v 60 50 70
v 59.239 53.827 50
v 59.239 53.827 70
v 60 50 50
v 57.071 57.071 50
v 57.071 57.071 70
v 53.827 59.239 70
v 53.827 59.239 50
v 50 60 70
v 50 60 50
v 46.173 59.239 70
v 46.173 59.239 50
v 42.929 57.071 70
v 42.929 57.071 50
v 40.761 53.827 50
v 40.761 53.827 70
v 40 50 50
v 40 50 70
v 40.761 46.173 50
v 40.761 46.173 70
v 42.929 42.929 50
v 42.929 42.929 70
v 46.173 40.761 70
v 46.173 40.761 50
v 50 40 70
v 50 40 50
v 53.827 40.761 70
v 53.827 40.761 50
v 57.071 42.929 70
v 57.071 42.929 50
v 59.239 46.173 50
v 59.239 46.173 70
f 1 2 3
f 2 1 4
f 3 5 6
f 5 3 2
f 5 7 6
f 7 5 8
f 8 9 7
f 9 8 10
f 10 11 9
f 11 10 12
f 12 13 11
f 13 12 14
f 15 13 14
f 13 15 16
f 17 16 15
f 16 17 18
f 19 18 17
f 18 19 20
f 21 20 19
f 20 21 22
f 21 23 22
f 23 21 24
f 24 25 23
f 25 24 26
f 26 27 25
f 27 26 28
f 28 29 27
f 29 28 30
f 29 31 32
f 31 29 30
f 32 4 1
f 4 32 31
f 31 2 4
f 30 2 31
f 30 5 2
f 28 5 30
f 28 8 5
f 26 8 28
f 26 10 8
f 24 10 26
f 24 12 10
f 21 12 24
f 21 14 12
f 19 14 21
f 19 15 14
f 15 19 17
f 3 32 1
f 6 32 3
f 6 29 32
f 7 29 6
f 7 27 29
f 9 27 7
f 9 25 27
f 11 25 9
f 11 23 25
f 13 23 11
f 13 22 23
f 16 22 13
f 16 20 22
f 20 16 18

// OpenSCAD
use <../_openscad_libs/threads.scad>


/*[ Slider ]*/
$fn=16; // [16:64]
// Width    Height     Depth
BASE_SIZE = [100, 100, 50];
/*[ Slider ]*/
BASE_FILLET = 5; // [0:50]
BASE_WALL_THICKNESS = 5; // [0:50]
/*[ Slider ]*/
// The height of the cylinder connecting the base and the leds.
SPAR_HEIGHT = 20; // [20:100]
/*[ Slider ]*/
// The height of the cylinder connecting the base and the leds.
LED_SLOT_WIDTH = 20; // [20:100]
/*[ Slider ]*/
// The height of the cylinder connecting the base and the leds.
LED_SLOT_RADIUS = 20; // [20:100]
/*[ Slider ]*/
lamp_straight_height_l=200;// [20:400]
/*[ Slider ]*/
lamp_straight_height_r=100; // [20:400]
/*[ Slider ]*/
led_slot_thickness = 5;// [5:20]
/*[ Slider ]*/
led_slot_depth = 10; // [10:40]

module fillet(r) {
   offset(r = -r) {
     offset(delta = r) {
       children();
     }
   }
}

module base_cover_screws() {
    // Screw holders
    x = BASE_SIZE[0]-BASE_WALL_THICKNESS*2;
    y = BASE_SIZE[1]-BASE_WALL_THICKNESS*2;
    z = 0;
    w = BASE_WALL_THICKNESS*1.33;
    holders = [
        [w,w,z],
        [x+w/2,w,z],
        [x+w/2,y+w/2,z],
        [w,y+w/2,z]
    ];

    for(a=[0:3]) {
        translate(holders[a]) 
        cylinder(h=20, r=2);
        translate(holders[a]-[0,0,2.5]) 
        cylinder(h = 2.5, r = 3.5);
    }
}

module base_cover() {
    difference() {
        translate([0,0,-BASE_WALL_THICKNESS/2])
        linear_extrude(height = BASE_WALL_THICKNESS)
        fillet(r = -BASE_FILLET)
        square([BASE_SIZE[0], BASE_SIZE[1]]);

        base();
    }
}

module base(size=BASE_SIZE) {
    // Screw holders
    x = BASE_SIZE[0]-BASE_WALL_THICKNESS*2;
    y = BASE_SIZE[1]-BASE_WALL_THICKNESS*2;
    z = 3;
    holders = [
        [1,1,z],
        [x-1,1,z],
        [x-1,y-1,z],
        [1,y-1,z]
    ];

    for(a=[0:3]) {
        translate(holders[a]) 
        linear_extrude(height = BASE_SIZE[2]-z)
        fillet(r = -3.5)
        square([10,10]);
    }

    difference() {
        linear_extrude(height = BASE_SIZE[2])
        fillet(r = -BASE_FILLET)
        square([BASE_SIZE[0], BASE_SIZE[1]]);

        translate([BASE_WALL_THICKNESS/2,BASE_WALL_THICKNESS/2,-BASE_WALL_THICKNESS]) 
        linear_extrude(height = BASE_SIZE[2])
        fillet(r = -BASE_FILLET)
        square([BASE_SIZE[0], BASE_SIZE[1]] - [BASE_WALL_THICKNESS, BASE_WALL_THICKNESS]);

        translate([BASE_SIZE[0]/2,BASE_WALL_THICKNESS,20]) 
        rotate([90,00,0]) 
        #cylinder(h = 5, r = 4);
    }
}

module spar_sub() {
    translate([BASE_SIZE[0]/2, BASE_SIZE[1]/2, BASE_SIZE[2] - SPAR_HEIGHT/2]) 
    cylinder(h = SPAR_HEIGHT*2, r = LED_SLOT_WIDTH/2-BASE_WALL_THICKNESS/2);
}

module spar(radius=LED_SLOT_WIDTH, height=SPAR_HEIGHT) {
    difference() {
        translate([BASE_SIZE[0]/2, BASE_SIZE[1]/2, BASE_SIZE[2]]) 
        cylinder(h=SPAR_HEIGHT, r=LED_SLOT_WIDTH/2);
    }
}

module led_slot_circle_sub() {
    center = [BASE_SIZE[0]/2, BASE_SIZE[1]/2, BASE_SIZE[2]];

    // cut out radius
    translate(center + [0,0,SPAR_HEIGHT/2 + LED_SLOT_RADIUS])
    rotate([90,0,0]) 
    cylinder(h = LED_SLOT_WIDTH-led_slot_thickness, r = LED_SLOT_RADIUS-led_slot_thickness, center=true);
}

module led_slot(){
    center = [BASE_SIZE[0]/2, BASE_SIZE[1]/2, BASE_SIZE[2]];
    
    difference() {
        union() {
            translate(center + [0,0,SPAR_HEIGHT/2 + LED_SLOT_RADIUS]) 
            rotate([90,0,0]) 
            cylinder(h = LED_SLOT_WIDTH, r = LED_SLOT_RADIUS, center=true);
        }

        //cut out "slot"
        translate(center + [0,0, SPAR_HEIGHT/2 + LED_SLOT_RADIUS])
        rotate([90,0,0]) 
        cylinder(h = LED_SLOT_WIDTH+5, r = LED_SLOT_RADIUS-led_slot_depth, center=true);

        // cut cylinder in half, to form bottom half circle of lamp
        translate(center + [0,0, SPAR_HEIGHT/2 + LED_SLOT_RADIUS*2])
        cube(size = [LED_SLOT_RADIUS*2,LED_SLOT_RADIUS*2, LED_SLOT_RADIUS*2], center=true);
    }

    arm_outer_size = LED_SLOT_WIDTH;
    arm_inner_size = LED_SLOT_WIDTH-led_slot_thickness;

    // left arm
    difference() {
        translate(center + [LED_SLOT_RADIUS-led_slot_depth/2,0,SPAR_HEIGHT/2 + LED_SLOT_RADIUS + lamp_straight_height_l/2])
        cube(size = [led_slot_depth, arm_outer_size, lamp_straight_height_l], center=true);

        translate(center + [(LED_SLOT_RADIUS-led_slot_depth/2)-led_slot_thickness,0,SPAR_HEIGHT/2 + LED_SLOT_RADIUS + lamp_straight_height_l/2])
        cube(size = [led_slot_depth, arm_inner_size, lamp_straight_height_l+1], center=true);
    }

    // right arm
    difference() {
        translate(center + [-LED_SLOT_RADIUS+led_slot_depth/2,0,SPAR_HEIGHT/2 + LED_SLOT_RADIUS + lamp_straight_height_r/2])
        cube(size = [led_slot_depth, arm_outer_size, lamp_straight_height_r], center=true);
    
        translate(center + [-(LED_SLOT_RADIUS-led_slot_depth/2)+led_slot_thickness,0,SPAR_HEIGHT/2 + LED_SLOT_RADIUS + lamp_straight_height_l/2])
        cube(size = [led_slot_depth, arm_inner_size, lamp_straight_height_l+1], center=true);
    }
}

module lamp() {
    difference() {
        union(){
            base();
            spar();
            led_slot();
        }
        spar_sub();
        led_slot_circle_sub();
        base_cover_screws();
    }
}


// base();
spar();

module ScrewThread(outer_diam=2, height=4, pitch=0, tooth_angle=30, tolerance=0.4, tip_height=0, tooth_height=0, tip_min_fract=0)

// lamp();

// translate([120,0,0]) 
// difference() {
//     base_cover();
//     base_cover_screws();
// }
